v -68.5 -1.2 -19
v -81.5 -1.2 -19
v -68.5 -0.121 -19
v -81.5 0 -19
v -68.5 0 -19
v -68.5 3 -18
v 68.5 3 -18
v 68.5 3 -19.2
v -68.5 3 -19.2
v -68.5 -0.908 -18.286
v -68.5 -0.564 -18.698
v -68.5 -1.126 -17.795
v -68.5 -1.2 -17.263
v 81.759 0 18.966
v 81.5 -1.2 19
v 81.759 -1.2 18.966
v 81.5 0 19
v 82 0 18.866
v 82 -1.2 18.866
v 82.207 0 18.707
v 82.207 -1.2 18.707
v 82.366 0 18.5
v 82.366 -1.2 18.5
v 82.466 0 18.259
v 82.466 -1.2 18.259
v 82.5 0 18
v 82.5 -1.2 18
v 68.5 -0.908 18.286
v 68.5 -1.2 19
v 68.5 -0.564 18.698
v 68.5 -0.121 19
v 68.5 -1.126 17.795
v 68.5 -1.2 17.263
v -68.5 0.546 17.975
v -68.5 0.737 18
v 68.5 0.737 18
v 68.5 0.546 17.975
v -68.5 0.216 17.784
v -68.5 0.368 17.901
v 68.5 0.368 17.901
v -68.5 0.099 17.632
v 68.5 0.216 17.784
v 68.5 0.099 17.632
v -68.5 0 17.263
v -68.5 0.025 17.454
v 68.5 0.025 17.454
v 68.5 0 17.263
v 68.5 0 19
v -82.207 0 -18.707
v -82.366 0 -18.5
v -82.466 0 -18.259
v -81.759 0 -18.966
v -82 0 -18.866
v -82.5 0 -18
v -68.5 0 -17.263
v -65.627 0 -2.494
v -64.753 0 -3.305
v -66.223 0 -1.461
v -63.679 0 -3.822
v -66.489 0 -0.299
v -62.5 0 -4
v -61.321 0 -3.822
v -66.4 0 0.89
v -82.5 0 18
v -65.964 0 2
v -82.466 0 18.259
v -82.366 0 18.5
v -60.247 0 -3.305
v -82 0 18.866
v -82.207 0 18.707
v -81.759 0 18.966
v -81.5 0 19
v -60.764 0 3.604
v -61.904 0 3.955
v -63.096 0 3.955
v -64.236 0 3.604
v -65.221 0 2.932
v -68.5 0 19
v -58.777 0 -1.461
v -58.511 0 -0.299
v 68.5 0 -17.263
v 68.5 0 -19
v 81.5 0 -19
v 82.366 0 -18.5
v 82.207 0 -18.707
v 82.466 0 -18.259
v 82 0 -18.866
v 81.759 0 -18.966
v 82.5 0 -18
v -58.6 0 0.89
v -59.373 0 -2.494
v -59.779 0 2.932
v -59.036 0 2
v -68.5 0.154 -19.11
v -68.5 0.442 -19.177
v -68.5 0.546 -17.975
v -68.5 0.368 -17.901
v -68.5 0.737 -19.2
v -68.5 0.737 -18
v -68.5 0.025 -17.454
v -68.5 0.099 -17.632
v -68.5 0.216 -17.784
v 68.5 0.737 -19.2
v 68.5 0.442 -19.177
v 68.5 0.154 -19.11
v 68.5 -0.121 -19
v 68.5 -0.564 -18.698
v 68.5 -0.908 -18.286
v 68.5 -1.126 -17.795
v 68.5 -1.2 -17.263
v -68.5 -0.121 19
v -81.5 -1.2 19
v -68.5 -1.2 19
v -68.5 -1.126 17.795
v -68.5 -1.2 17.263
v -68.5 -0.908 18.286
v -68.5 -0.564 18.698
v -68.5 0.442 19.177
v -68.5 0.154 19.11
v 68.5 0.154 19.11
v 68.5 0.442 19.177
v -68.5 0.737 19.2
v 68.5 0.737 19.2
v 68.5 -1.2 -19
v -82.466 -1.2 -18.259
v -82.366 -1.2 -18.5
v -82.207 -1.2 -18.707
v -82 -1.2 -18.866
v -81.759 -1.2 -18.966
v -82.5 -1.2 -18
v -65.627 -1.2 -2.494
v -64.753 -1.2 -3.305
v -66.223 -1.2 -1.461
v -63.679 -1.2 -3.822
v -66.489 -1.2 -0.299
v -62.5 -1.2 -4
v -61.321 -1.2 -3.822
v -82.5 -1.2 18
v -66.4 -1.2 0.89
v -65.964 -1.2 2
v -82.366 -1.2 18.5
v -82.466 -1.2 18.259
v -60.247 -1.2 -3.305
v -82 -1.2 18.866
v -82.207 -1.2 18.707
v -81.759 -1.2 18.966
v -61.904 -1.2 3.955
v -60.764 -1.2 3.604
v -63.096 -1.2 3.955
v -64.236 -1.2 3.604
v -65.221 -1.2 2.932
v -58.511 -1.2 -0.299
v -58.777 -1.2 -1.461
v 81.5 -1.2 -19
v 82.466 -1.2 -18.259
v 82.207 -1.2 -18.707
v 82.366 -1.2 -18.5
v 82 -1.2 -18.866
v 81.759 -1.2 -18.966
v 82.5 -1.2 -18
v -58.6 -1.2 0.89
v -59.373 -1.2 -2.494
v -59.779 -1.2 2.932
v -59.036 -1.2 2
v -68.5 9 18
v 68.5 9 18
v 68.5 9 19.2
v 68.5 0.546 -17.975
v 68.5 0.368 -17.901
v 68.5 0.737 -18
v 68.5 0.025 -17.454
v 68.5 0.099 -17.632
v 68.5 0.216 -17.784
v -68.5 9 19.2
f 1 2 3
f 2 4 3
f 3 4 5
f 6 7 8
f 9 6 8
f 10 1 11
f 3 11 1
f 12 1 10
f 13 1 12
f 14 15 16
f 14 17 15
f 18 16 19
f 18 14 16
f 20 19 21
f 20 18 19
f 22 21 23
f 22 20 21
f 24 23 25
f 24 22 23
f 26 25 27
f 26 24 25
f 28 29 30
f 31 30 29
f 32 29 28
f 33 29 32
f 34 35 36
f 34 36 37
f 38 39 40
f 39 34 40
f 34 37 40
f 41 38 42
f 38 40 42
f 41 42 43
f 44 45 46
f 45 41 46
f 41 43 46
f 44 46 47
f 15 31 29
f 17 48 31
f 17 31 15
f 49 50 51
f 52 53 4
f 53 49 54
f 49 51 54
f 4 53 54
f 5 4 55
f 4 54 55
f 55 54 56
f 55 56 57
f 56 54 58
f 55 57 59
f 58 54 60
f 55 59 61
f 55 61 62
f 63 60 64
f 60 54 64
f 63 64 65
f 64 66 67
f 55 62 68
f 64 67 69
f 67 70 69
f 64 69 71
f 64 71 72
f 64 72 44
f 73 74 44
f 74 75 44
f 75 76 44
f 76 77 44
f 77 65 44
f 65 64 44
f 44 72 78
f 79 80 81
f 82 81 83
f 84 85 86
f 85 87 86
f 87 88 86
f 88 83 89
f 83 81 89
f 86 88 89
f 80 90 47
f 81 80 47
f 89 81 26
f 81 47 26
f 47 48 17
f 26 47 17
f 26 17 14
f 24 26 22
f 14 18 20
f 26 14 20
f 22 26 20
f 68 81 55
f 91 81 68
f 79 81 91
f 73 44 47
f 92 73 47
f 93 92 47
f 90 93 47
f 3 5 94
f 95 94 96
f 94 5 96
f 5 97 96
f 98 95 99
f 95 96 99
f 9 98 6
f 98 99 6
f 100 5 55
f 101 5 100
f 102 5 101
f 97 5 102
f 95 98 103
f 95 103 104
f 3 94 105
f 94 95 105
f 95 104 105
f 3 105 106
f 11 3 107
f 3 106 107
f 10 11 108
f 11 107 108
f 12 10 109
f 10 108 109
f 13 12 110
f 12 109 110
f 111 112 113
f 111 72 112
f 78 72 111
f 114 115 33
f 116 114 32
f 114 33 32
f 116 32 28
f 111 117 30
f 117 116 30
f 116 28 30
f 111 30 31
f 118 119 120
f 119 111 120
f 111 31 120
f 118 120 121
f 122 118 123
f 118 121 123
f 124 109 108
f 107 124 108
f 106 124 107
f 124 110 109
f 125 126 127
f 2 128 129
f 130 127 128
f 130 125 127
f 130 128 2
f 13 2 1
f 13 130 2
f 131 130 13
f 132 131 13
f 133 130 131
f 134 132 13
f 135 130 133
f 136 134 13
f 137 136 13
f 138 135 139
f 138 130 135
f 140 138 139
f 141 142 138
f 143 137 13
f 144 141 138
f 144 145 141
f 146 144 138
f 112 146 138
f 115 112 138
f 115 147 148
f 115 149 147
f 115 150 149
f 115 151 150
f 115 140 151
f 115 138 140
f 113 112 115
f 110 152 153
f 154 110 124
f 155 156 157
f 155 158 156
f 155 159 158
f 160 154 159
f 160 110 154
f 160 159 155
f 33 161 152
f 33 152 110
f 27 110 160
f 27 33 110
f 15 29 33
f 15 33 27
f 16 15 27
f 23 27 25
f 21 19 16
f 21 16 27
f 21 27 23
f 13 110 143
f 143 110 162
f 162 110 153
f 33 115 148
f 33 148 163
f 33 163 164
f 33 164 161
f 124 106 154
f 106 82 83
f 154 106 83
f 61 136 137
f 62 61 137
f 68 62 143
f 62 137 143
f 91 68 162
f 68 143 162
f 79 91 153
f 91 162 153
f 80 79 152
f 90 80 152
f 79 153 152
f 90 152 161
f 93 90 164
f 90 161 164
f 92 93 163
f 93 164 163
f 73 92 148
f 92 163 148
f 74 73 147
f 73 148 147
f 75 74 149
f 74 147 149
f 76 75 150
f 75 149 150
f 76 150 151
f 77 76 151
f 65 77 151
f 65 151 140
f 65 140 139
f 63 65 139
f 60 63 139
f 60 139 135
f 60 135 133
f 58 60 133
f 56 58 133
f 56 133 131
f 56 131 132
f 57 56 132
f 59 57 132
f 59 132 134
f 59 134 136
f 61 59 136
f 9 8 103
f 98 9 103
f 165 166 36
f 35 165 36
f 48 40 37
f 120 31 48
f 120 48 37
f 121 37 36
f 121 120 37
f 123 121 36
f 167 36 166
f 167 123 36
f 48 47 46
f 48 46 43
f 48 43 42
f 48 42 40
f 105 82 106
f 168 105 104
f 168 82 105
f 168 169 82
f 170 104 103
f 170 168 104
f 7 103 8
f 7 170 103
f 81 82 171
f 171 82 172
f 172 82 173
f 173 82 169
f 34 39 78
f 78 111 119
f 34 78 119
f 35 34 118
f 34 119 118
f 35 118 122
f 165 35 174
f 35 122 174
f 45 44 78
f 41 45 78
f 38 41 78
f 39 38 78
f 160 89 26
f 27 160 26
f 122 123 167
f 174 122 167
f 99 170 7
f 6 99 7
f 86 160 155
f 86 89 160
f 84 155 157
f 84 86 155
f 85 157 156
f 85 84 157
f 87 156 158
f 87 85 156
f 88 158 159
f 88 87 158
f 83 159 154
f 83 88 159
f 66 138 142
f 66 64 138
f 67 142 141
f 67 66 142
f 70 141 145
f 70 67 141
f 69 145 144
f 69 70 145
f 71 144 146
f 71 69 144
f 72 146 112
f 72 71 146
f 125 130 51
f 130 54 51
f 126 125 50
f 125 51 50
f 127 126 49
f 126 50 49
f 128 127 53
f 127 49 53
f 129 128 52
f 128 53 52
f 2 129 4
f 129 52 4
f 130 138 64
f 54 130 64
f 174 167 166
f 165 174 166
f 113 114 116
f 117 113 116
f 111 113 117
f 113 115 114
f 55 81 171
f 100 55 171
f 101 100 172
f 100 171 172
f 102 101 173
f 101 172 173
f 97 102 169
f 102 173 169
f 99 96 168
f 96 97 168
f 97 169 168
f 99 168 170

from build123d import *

# Parameters (mm, degrees)
FLANGE_BASE2_DEPTH       = 82.5
CORTE_EXTRUS_O3_START    = -82.5
CORTE_EXTRUS_O3_DEPTH    = 14
CORTE_EXTRUS_O3_START_2  = 68.5
CORTE_EXTRUS_O3_2_DEPTH  = 14
ESBO_O12_W               = 14
ESBO_O12_H               = 1.2
RESSALTO_EXTRUS_O1_DEPTH = 19
FILETE1_R                = 1
ESBO_O13_R               = 4
CORTE_EXTRUS_O4_DEPTH    = 86.316645504


# Read off the part's stored shape, not the designer's step: Corte-extrusão3
# Sheet-metal steps are written as plain solids
with BuildPart() as part:
    # Esboço1 → Flange-base2 (new, symmetric)
    with BuildSketch(Plane(origin=(0, 0, 0), x_dir=(0, 0, -1), z_dir=(1, 0, 0))):
        with BuildLine():
            Line((-18, 9), (-18, 0.7366))
            ThreePointArc((-18, 0.7366), (-17.784254855, 0.215745145), (-17.2634, 0))
            Line((-17.2634, 0), (17.2634, 0))
            ThreePointArc((17.2634, 0), (17.784254855, 0.215745145), (18, 0.7366))
            Line((18, 0.7366), (18, 3))
            Line((18, 3), (19.2, 3))
            Line((19.2, 3), (19.2, 0.7366))
            ThreePointArc((19.2, 0.7366), (18.632782992, -0.632782992), (17.2634, -1.2))
            Line((17.2634, -1.2), (-17.2634, -1.2))
            ThreePointArc((-17.2634, -1.2), (-18.632782992, -0.632782992), (-19.2, 0.7366))
            Line((-19.2, 0.7366), (-19.2, 9))
            Line((-19.2, 9), (-18, 9))
        make_face()
    extrude(amount=FLANGE_BASE2_DEPTH, both=True)

    # Corte-extrusão3 outline → Corte-extrusão3 (cut)
    with BuildSketch(Plane.YZ.offset(CORTE_EXTRUS_O3_START)):
        with BuildLine():
            Line((-1.2, 17.2634), (0, 17.2634))
            ThreePointArc((0, 17.2634), (0.215745145, 17.784254855), (0.7366, 18))
            Line((0.7366, 18), (9, 18))
            Line((9, 18), (9, 19.2))
            Line((9, 19.2), (0.7366, 19.2))
            ThreePointArc((0.7366, 19.2), (-0.632782992, 18.632782992), (-1.2, 17.2634))
        make_face()
        with BuildLine():
            ThreePointArc((0.7366, -18), (0.215745145, -17.784254855), (0, -17.2634))
            Line((0, -17.2634), (-1.2, -17.2634))
            ThreePointArc((-1.2, -17.2634), (-0.632782992, -18.632782992), (0.7366, -19.2))
            Line((0.7366, -19.2), (3, -19.2))
            Line((3, -19.2), (3, -18))
            Line((3, -18), (0.7366, -18))
        make_face()
    extrude(amount=CORTE_EXTRUS_O3_DEPTH, mode=Mode.SUBTRACT)

    # Corte-extrus_o3 2 outline → Corte-extrus_o3 2 (cut)
    with BuildSketch(Plane.YZ.offset(CORTE_EXTRUS_O3_START_2)):
        with BuildLine():
            Line((-1.2, 17.2634), (0, 17.2634))
            ThreePointArc((0, 17.2634), (0.215745145, 17.784254855), (0.7366, 18))
            Line((0.7366, 18), (9, 18))
            Line((9, 18), (9, 19.2))
            Line((9, 19.2), (0.7366, 19.2))
            ThreePointArc((0.7366, 19.2), (-0.632782992, 18.632782992), (-1.2, 17.2634))
        make_face()
        with BuildLine():
            ThreePointArc((0.7366, -18), (0.215745145, -17.784254855), (0, -17.2634))
            Line((0, -17.2634), (-1.2, -17.2634))
            ThreePointArc((-1.2, -17.2634), (-0.632782992, -18.632782992), (0.7366, -19.2))
            Line((0.7366, -19.2), (3, -19.2))
            Line((3, -19.2), (3, -18))
            Line((3, -18), (0.7366, -18))
        make_face()
    extrude(amount=CORTE_EXTRUS_O3_2_DEPTH, mode=Mode.SUBTRACT)

    # Esboço12 → Ressalto-extrusão1 (add, symmetric)
    with BuildSketch(Plane.XY):
        with Locations((75.5, -0.6)):
            Rectangle(ESBO_O12_W, ESBO_O12_H)
        with Locations((-75.5, -0.6)):
            Rectangle(ESBO_O12_W, ESBO_O12_H)
    extrude(amount=RESSALTO_EXTRUS_O1_DEPTH, both=True)

    # Filete1
    filete1_edges = [part.edges().sort_by_distance(p)[0] for p in [
        (82.5, -0.6, -19),
        (82.5, -0.6, 19),
        (-82.5, -0.6, -19),
        (-82.5, -0.6, 19),
    ]]
    fillet(filete1_edges, radius=FILETE1_R)

    # Esboço13 → Corte-extrusão4 (cut, through all)
    with BuildSketch(Plane.XZ.offset(1.2)):
        with Locations(Location((-62.5, 0, 0), (0, 0, 270))):
            Circle(ESBO_O13_R)
    extrude(amount=-CORTE_EXTRUS_O4_DEPTH, mode=Mode.SUBTRACT)


solid = part.part
